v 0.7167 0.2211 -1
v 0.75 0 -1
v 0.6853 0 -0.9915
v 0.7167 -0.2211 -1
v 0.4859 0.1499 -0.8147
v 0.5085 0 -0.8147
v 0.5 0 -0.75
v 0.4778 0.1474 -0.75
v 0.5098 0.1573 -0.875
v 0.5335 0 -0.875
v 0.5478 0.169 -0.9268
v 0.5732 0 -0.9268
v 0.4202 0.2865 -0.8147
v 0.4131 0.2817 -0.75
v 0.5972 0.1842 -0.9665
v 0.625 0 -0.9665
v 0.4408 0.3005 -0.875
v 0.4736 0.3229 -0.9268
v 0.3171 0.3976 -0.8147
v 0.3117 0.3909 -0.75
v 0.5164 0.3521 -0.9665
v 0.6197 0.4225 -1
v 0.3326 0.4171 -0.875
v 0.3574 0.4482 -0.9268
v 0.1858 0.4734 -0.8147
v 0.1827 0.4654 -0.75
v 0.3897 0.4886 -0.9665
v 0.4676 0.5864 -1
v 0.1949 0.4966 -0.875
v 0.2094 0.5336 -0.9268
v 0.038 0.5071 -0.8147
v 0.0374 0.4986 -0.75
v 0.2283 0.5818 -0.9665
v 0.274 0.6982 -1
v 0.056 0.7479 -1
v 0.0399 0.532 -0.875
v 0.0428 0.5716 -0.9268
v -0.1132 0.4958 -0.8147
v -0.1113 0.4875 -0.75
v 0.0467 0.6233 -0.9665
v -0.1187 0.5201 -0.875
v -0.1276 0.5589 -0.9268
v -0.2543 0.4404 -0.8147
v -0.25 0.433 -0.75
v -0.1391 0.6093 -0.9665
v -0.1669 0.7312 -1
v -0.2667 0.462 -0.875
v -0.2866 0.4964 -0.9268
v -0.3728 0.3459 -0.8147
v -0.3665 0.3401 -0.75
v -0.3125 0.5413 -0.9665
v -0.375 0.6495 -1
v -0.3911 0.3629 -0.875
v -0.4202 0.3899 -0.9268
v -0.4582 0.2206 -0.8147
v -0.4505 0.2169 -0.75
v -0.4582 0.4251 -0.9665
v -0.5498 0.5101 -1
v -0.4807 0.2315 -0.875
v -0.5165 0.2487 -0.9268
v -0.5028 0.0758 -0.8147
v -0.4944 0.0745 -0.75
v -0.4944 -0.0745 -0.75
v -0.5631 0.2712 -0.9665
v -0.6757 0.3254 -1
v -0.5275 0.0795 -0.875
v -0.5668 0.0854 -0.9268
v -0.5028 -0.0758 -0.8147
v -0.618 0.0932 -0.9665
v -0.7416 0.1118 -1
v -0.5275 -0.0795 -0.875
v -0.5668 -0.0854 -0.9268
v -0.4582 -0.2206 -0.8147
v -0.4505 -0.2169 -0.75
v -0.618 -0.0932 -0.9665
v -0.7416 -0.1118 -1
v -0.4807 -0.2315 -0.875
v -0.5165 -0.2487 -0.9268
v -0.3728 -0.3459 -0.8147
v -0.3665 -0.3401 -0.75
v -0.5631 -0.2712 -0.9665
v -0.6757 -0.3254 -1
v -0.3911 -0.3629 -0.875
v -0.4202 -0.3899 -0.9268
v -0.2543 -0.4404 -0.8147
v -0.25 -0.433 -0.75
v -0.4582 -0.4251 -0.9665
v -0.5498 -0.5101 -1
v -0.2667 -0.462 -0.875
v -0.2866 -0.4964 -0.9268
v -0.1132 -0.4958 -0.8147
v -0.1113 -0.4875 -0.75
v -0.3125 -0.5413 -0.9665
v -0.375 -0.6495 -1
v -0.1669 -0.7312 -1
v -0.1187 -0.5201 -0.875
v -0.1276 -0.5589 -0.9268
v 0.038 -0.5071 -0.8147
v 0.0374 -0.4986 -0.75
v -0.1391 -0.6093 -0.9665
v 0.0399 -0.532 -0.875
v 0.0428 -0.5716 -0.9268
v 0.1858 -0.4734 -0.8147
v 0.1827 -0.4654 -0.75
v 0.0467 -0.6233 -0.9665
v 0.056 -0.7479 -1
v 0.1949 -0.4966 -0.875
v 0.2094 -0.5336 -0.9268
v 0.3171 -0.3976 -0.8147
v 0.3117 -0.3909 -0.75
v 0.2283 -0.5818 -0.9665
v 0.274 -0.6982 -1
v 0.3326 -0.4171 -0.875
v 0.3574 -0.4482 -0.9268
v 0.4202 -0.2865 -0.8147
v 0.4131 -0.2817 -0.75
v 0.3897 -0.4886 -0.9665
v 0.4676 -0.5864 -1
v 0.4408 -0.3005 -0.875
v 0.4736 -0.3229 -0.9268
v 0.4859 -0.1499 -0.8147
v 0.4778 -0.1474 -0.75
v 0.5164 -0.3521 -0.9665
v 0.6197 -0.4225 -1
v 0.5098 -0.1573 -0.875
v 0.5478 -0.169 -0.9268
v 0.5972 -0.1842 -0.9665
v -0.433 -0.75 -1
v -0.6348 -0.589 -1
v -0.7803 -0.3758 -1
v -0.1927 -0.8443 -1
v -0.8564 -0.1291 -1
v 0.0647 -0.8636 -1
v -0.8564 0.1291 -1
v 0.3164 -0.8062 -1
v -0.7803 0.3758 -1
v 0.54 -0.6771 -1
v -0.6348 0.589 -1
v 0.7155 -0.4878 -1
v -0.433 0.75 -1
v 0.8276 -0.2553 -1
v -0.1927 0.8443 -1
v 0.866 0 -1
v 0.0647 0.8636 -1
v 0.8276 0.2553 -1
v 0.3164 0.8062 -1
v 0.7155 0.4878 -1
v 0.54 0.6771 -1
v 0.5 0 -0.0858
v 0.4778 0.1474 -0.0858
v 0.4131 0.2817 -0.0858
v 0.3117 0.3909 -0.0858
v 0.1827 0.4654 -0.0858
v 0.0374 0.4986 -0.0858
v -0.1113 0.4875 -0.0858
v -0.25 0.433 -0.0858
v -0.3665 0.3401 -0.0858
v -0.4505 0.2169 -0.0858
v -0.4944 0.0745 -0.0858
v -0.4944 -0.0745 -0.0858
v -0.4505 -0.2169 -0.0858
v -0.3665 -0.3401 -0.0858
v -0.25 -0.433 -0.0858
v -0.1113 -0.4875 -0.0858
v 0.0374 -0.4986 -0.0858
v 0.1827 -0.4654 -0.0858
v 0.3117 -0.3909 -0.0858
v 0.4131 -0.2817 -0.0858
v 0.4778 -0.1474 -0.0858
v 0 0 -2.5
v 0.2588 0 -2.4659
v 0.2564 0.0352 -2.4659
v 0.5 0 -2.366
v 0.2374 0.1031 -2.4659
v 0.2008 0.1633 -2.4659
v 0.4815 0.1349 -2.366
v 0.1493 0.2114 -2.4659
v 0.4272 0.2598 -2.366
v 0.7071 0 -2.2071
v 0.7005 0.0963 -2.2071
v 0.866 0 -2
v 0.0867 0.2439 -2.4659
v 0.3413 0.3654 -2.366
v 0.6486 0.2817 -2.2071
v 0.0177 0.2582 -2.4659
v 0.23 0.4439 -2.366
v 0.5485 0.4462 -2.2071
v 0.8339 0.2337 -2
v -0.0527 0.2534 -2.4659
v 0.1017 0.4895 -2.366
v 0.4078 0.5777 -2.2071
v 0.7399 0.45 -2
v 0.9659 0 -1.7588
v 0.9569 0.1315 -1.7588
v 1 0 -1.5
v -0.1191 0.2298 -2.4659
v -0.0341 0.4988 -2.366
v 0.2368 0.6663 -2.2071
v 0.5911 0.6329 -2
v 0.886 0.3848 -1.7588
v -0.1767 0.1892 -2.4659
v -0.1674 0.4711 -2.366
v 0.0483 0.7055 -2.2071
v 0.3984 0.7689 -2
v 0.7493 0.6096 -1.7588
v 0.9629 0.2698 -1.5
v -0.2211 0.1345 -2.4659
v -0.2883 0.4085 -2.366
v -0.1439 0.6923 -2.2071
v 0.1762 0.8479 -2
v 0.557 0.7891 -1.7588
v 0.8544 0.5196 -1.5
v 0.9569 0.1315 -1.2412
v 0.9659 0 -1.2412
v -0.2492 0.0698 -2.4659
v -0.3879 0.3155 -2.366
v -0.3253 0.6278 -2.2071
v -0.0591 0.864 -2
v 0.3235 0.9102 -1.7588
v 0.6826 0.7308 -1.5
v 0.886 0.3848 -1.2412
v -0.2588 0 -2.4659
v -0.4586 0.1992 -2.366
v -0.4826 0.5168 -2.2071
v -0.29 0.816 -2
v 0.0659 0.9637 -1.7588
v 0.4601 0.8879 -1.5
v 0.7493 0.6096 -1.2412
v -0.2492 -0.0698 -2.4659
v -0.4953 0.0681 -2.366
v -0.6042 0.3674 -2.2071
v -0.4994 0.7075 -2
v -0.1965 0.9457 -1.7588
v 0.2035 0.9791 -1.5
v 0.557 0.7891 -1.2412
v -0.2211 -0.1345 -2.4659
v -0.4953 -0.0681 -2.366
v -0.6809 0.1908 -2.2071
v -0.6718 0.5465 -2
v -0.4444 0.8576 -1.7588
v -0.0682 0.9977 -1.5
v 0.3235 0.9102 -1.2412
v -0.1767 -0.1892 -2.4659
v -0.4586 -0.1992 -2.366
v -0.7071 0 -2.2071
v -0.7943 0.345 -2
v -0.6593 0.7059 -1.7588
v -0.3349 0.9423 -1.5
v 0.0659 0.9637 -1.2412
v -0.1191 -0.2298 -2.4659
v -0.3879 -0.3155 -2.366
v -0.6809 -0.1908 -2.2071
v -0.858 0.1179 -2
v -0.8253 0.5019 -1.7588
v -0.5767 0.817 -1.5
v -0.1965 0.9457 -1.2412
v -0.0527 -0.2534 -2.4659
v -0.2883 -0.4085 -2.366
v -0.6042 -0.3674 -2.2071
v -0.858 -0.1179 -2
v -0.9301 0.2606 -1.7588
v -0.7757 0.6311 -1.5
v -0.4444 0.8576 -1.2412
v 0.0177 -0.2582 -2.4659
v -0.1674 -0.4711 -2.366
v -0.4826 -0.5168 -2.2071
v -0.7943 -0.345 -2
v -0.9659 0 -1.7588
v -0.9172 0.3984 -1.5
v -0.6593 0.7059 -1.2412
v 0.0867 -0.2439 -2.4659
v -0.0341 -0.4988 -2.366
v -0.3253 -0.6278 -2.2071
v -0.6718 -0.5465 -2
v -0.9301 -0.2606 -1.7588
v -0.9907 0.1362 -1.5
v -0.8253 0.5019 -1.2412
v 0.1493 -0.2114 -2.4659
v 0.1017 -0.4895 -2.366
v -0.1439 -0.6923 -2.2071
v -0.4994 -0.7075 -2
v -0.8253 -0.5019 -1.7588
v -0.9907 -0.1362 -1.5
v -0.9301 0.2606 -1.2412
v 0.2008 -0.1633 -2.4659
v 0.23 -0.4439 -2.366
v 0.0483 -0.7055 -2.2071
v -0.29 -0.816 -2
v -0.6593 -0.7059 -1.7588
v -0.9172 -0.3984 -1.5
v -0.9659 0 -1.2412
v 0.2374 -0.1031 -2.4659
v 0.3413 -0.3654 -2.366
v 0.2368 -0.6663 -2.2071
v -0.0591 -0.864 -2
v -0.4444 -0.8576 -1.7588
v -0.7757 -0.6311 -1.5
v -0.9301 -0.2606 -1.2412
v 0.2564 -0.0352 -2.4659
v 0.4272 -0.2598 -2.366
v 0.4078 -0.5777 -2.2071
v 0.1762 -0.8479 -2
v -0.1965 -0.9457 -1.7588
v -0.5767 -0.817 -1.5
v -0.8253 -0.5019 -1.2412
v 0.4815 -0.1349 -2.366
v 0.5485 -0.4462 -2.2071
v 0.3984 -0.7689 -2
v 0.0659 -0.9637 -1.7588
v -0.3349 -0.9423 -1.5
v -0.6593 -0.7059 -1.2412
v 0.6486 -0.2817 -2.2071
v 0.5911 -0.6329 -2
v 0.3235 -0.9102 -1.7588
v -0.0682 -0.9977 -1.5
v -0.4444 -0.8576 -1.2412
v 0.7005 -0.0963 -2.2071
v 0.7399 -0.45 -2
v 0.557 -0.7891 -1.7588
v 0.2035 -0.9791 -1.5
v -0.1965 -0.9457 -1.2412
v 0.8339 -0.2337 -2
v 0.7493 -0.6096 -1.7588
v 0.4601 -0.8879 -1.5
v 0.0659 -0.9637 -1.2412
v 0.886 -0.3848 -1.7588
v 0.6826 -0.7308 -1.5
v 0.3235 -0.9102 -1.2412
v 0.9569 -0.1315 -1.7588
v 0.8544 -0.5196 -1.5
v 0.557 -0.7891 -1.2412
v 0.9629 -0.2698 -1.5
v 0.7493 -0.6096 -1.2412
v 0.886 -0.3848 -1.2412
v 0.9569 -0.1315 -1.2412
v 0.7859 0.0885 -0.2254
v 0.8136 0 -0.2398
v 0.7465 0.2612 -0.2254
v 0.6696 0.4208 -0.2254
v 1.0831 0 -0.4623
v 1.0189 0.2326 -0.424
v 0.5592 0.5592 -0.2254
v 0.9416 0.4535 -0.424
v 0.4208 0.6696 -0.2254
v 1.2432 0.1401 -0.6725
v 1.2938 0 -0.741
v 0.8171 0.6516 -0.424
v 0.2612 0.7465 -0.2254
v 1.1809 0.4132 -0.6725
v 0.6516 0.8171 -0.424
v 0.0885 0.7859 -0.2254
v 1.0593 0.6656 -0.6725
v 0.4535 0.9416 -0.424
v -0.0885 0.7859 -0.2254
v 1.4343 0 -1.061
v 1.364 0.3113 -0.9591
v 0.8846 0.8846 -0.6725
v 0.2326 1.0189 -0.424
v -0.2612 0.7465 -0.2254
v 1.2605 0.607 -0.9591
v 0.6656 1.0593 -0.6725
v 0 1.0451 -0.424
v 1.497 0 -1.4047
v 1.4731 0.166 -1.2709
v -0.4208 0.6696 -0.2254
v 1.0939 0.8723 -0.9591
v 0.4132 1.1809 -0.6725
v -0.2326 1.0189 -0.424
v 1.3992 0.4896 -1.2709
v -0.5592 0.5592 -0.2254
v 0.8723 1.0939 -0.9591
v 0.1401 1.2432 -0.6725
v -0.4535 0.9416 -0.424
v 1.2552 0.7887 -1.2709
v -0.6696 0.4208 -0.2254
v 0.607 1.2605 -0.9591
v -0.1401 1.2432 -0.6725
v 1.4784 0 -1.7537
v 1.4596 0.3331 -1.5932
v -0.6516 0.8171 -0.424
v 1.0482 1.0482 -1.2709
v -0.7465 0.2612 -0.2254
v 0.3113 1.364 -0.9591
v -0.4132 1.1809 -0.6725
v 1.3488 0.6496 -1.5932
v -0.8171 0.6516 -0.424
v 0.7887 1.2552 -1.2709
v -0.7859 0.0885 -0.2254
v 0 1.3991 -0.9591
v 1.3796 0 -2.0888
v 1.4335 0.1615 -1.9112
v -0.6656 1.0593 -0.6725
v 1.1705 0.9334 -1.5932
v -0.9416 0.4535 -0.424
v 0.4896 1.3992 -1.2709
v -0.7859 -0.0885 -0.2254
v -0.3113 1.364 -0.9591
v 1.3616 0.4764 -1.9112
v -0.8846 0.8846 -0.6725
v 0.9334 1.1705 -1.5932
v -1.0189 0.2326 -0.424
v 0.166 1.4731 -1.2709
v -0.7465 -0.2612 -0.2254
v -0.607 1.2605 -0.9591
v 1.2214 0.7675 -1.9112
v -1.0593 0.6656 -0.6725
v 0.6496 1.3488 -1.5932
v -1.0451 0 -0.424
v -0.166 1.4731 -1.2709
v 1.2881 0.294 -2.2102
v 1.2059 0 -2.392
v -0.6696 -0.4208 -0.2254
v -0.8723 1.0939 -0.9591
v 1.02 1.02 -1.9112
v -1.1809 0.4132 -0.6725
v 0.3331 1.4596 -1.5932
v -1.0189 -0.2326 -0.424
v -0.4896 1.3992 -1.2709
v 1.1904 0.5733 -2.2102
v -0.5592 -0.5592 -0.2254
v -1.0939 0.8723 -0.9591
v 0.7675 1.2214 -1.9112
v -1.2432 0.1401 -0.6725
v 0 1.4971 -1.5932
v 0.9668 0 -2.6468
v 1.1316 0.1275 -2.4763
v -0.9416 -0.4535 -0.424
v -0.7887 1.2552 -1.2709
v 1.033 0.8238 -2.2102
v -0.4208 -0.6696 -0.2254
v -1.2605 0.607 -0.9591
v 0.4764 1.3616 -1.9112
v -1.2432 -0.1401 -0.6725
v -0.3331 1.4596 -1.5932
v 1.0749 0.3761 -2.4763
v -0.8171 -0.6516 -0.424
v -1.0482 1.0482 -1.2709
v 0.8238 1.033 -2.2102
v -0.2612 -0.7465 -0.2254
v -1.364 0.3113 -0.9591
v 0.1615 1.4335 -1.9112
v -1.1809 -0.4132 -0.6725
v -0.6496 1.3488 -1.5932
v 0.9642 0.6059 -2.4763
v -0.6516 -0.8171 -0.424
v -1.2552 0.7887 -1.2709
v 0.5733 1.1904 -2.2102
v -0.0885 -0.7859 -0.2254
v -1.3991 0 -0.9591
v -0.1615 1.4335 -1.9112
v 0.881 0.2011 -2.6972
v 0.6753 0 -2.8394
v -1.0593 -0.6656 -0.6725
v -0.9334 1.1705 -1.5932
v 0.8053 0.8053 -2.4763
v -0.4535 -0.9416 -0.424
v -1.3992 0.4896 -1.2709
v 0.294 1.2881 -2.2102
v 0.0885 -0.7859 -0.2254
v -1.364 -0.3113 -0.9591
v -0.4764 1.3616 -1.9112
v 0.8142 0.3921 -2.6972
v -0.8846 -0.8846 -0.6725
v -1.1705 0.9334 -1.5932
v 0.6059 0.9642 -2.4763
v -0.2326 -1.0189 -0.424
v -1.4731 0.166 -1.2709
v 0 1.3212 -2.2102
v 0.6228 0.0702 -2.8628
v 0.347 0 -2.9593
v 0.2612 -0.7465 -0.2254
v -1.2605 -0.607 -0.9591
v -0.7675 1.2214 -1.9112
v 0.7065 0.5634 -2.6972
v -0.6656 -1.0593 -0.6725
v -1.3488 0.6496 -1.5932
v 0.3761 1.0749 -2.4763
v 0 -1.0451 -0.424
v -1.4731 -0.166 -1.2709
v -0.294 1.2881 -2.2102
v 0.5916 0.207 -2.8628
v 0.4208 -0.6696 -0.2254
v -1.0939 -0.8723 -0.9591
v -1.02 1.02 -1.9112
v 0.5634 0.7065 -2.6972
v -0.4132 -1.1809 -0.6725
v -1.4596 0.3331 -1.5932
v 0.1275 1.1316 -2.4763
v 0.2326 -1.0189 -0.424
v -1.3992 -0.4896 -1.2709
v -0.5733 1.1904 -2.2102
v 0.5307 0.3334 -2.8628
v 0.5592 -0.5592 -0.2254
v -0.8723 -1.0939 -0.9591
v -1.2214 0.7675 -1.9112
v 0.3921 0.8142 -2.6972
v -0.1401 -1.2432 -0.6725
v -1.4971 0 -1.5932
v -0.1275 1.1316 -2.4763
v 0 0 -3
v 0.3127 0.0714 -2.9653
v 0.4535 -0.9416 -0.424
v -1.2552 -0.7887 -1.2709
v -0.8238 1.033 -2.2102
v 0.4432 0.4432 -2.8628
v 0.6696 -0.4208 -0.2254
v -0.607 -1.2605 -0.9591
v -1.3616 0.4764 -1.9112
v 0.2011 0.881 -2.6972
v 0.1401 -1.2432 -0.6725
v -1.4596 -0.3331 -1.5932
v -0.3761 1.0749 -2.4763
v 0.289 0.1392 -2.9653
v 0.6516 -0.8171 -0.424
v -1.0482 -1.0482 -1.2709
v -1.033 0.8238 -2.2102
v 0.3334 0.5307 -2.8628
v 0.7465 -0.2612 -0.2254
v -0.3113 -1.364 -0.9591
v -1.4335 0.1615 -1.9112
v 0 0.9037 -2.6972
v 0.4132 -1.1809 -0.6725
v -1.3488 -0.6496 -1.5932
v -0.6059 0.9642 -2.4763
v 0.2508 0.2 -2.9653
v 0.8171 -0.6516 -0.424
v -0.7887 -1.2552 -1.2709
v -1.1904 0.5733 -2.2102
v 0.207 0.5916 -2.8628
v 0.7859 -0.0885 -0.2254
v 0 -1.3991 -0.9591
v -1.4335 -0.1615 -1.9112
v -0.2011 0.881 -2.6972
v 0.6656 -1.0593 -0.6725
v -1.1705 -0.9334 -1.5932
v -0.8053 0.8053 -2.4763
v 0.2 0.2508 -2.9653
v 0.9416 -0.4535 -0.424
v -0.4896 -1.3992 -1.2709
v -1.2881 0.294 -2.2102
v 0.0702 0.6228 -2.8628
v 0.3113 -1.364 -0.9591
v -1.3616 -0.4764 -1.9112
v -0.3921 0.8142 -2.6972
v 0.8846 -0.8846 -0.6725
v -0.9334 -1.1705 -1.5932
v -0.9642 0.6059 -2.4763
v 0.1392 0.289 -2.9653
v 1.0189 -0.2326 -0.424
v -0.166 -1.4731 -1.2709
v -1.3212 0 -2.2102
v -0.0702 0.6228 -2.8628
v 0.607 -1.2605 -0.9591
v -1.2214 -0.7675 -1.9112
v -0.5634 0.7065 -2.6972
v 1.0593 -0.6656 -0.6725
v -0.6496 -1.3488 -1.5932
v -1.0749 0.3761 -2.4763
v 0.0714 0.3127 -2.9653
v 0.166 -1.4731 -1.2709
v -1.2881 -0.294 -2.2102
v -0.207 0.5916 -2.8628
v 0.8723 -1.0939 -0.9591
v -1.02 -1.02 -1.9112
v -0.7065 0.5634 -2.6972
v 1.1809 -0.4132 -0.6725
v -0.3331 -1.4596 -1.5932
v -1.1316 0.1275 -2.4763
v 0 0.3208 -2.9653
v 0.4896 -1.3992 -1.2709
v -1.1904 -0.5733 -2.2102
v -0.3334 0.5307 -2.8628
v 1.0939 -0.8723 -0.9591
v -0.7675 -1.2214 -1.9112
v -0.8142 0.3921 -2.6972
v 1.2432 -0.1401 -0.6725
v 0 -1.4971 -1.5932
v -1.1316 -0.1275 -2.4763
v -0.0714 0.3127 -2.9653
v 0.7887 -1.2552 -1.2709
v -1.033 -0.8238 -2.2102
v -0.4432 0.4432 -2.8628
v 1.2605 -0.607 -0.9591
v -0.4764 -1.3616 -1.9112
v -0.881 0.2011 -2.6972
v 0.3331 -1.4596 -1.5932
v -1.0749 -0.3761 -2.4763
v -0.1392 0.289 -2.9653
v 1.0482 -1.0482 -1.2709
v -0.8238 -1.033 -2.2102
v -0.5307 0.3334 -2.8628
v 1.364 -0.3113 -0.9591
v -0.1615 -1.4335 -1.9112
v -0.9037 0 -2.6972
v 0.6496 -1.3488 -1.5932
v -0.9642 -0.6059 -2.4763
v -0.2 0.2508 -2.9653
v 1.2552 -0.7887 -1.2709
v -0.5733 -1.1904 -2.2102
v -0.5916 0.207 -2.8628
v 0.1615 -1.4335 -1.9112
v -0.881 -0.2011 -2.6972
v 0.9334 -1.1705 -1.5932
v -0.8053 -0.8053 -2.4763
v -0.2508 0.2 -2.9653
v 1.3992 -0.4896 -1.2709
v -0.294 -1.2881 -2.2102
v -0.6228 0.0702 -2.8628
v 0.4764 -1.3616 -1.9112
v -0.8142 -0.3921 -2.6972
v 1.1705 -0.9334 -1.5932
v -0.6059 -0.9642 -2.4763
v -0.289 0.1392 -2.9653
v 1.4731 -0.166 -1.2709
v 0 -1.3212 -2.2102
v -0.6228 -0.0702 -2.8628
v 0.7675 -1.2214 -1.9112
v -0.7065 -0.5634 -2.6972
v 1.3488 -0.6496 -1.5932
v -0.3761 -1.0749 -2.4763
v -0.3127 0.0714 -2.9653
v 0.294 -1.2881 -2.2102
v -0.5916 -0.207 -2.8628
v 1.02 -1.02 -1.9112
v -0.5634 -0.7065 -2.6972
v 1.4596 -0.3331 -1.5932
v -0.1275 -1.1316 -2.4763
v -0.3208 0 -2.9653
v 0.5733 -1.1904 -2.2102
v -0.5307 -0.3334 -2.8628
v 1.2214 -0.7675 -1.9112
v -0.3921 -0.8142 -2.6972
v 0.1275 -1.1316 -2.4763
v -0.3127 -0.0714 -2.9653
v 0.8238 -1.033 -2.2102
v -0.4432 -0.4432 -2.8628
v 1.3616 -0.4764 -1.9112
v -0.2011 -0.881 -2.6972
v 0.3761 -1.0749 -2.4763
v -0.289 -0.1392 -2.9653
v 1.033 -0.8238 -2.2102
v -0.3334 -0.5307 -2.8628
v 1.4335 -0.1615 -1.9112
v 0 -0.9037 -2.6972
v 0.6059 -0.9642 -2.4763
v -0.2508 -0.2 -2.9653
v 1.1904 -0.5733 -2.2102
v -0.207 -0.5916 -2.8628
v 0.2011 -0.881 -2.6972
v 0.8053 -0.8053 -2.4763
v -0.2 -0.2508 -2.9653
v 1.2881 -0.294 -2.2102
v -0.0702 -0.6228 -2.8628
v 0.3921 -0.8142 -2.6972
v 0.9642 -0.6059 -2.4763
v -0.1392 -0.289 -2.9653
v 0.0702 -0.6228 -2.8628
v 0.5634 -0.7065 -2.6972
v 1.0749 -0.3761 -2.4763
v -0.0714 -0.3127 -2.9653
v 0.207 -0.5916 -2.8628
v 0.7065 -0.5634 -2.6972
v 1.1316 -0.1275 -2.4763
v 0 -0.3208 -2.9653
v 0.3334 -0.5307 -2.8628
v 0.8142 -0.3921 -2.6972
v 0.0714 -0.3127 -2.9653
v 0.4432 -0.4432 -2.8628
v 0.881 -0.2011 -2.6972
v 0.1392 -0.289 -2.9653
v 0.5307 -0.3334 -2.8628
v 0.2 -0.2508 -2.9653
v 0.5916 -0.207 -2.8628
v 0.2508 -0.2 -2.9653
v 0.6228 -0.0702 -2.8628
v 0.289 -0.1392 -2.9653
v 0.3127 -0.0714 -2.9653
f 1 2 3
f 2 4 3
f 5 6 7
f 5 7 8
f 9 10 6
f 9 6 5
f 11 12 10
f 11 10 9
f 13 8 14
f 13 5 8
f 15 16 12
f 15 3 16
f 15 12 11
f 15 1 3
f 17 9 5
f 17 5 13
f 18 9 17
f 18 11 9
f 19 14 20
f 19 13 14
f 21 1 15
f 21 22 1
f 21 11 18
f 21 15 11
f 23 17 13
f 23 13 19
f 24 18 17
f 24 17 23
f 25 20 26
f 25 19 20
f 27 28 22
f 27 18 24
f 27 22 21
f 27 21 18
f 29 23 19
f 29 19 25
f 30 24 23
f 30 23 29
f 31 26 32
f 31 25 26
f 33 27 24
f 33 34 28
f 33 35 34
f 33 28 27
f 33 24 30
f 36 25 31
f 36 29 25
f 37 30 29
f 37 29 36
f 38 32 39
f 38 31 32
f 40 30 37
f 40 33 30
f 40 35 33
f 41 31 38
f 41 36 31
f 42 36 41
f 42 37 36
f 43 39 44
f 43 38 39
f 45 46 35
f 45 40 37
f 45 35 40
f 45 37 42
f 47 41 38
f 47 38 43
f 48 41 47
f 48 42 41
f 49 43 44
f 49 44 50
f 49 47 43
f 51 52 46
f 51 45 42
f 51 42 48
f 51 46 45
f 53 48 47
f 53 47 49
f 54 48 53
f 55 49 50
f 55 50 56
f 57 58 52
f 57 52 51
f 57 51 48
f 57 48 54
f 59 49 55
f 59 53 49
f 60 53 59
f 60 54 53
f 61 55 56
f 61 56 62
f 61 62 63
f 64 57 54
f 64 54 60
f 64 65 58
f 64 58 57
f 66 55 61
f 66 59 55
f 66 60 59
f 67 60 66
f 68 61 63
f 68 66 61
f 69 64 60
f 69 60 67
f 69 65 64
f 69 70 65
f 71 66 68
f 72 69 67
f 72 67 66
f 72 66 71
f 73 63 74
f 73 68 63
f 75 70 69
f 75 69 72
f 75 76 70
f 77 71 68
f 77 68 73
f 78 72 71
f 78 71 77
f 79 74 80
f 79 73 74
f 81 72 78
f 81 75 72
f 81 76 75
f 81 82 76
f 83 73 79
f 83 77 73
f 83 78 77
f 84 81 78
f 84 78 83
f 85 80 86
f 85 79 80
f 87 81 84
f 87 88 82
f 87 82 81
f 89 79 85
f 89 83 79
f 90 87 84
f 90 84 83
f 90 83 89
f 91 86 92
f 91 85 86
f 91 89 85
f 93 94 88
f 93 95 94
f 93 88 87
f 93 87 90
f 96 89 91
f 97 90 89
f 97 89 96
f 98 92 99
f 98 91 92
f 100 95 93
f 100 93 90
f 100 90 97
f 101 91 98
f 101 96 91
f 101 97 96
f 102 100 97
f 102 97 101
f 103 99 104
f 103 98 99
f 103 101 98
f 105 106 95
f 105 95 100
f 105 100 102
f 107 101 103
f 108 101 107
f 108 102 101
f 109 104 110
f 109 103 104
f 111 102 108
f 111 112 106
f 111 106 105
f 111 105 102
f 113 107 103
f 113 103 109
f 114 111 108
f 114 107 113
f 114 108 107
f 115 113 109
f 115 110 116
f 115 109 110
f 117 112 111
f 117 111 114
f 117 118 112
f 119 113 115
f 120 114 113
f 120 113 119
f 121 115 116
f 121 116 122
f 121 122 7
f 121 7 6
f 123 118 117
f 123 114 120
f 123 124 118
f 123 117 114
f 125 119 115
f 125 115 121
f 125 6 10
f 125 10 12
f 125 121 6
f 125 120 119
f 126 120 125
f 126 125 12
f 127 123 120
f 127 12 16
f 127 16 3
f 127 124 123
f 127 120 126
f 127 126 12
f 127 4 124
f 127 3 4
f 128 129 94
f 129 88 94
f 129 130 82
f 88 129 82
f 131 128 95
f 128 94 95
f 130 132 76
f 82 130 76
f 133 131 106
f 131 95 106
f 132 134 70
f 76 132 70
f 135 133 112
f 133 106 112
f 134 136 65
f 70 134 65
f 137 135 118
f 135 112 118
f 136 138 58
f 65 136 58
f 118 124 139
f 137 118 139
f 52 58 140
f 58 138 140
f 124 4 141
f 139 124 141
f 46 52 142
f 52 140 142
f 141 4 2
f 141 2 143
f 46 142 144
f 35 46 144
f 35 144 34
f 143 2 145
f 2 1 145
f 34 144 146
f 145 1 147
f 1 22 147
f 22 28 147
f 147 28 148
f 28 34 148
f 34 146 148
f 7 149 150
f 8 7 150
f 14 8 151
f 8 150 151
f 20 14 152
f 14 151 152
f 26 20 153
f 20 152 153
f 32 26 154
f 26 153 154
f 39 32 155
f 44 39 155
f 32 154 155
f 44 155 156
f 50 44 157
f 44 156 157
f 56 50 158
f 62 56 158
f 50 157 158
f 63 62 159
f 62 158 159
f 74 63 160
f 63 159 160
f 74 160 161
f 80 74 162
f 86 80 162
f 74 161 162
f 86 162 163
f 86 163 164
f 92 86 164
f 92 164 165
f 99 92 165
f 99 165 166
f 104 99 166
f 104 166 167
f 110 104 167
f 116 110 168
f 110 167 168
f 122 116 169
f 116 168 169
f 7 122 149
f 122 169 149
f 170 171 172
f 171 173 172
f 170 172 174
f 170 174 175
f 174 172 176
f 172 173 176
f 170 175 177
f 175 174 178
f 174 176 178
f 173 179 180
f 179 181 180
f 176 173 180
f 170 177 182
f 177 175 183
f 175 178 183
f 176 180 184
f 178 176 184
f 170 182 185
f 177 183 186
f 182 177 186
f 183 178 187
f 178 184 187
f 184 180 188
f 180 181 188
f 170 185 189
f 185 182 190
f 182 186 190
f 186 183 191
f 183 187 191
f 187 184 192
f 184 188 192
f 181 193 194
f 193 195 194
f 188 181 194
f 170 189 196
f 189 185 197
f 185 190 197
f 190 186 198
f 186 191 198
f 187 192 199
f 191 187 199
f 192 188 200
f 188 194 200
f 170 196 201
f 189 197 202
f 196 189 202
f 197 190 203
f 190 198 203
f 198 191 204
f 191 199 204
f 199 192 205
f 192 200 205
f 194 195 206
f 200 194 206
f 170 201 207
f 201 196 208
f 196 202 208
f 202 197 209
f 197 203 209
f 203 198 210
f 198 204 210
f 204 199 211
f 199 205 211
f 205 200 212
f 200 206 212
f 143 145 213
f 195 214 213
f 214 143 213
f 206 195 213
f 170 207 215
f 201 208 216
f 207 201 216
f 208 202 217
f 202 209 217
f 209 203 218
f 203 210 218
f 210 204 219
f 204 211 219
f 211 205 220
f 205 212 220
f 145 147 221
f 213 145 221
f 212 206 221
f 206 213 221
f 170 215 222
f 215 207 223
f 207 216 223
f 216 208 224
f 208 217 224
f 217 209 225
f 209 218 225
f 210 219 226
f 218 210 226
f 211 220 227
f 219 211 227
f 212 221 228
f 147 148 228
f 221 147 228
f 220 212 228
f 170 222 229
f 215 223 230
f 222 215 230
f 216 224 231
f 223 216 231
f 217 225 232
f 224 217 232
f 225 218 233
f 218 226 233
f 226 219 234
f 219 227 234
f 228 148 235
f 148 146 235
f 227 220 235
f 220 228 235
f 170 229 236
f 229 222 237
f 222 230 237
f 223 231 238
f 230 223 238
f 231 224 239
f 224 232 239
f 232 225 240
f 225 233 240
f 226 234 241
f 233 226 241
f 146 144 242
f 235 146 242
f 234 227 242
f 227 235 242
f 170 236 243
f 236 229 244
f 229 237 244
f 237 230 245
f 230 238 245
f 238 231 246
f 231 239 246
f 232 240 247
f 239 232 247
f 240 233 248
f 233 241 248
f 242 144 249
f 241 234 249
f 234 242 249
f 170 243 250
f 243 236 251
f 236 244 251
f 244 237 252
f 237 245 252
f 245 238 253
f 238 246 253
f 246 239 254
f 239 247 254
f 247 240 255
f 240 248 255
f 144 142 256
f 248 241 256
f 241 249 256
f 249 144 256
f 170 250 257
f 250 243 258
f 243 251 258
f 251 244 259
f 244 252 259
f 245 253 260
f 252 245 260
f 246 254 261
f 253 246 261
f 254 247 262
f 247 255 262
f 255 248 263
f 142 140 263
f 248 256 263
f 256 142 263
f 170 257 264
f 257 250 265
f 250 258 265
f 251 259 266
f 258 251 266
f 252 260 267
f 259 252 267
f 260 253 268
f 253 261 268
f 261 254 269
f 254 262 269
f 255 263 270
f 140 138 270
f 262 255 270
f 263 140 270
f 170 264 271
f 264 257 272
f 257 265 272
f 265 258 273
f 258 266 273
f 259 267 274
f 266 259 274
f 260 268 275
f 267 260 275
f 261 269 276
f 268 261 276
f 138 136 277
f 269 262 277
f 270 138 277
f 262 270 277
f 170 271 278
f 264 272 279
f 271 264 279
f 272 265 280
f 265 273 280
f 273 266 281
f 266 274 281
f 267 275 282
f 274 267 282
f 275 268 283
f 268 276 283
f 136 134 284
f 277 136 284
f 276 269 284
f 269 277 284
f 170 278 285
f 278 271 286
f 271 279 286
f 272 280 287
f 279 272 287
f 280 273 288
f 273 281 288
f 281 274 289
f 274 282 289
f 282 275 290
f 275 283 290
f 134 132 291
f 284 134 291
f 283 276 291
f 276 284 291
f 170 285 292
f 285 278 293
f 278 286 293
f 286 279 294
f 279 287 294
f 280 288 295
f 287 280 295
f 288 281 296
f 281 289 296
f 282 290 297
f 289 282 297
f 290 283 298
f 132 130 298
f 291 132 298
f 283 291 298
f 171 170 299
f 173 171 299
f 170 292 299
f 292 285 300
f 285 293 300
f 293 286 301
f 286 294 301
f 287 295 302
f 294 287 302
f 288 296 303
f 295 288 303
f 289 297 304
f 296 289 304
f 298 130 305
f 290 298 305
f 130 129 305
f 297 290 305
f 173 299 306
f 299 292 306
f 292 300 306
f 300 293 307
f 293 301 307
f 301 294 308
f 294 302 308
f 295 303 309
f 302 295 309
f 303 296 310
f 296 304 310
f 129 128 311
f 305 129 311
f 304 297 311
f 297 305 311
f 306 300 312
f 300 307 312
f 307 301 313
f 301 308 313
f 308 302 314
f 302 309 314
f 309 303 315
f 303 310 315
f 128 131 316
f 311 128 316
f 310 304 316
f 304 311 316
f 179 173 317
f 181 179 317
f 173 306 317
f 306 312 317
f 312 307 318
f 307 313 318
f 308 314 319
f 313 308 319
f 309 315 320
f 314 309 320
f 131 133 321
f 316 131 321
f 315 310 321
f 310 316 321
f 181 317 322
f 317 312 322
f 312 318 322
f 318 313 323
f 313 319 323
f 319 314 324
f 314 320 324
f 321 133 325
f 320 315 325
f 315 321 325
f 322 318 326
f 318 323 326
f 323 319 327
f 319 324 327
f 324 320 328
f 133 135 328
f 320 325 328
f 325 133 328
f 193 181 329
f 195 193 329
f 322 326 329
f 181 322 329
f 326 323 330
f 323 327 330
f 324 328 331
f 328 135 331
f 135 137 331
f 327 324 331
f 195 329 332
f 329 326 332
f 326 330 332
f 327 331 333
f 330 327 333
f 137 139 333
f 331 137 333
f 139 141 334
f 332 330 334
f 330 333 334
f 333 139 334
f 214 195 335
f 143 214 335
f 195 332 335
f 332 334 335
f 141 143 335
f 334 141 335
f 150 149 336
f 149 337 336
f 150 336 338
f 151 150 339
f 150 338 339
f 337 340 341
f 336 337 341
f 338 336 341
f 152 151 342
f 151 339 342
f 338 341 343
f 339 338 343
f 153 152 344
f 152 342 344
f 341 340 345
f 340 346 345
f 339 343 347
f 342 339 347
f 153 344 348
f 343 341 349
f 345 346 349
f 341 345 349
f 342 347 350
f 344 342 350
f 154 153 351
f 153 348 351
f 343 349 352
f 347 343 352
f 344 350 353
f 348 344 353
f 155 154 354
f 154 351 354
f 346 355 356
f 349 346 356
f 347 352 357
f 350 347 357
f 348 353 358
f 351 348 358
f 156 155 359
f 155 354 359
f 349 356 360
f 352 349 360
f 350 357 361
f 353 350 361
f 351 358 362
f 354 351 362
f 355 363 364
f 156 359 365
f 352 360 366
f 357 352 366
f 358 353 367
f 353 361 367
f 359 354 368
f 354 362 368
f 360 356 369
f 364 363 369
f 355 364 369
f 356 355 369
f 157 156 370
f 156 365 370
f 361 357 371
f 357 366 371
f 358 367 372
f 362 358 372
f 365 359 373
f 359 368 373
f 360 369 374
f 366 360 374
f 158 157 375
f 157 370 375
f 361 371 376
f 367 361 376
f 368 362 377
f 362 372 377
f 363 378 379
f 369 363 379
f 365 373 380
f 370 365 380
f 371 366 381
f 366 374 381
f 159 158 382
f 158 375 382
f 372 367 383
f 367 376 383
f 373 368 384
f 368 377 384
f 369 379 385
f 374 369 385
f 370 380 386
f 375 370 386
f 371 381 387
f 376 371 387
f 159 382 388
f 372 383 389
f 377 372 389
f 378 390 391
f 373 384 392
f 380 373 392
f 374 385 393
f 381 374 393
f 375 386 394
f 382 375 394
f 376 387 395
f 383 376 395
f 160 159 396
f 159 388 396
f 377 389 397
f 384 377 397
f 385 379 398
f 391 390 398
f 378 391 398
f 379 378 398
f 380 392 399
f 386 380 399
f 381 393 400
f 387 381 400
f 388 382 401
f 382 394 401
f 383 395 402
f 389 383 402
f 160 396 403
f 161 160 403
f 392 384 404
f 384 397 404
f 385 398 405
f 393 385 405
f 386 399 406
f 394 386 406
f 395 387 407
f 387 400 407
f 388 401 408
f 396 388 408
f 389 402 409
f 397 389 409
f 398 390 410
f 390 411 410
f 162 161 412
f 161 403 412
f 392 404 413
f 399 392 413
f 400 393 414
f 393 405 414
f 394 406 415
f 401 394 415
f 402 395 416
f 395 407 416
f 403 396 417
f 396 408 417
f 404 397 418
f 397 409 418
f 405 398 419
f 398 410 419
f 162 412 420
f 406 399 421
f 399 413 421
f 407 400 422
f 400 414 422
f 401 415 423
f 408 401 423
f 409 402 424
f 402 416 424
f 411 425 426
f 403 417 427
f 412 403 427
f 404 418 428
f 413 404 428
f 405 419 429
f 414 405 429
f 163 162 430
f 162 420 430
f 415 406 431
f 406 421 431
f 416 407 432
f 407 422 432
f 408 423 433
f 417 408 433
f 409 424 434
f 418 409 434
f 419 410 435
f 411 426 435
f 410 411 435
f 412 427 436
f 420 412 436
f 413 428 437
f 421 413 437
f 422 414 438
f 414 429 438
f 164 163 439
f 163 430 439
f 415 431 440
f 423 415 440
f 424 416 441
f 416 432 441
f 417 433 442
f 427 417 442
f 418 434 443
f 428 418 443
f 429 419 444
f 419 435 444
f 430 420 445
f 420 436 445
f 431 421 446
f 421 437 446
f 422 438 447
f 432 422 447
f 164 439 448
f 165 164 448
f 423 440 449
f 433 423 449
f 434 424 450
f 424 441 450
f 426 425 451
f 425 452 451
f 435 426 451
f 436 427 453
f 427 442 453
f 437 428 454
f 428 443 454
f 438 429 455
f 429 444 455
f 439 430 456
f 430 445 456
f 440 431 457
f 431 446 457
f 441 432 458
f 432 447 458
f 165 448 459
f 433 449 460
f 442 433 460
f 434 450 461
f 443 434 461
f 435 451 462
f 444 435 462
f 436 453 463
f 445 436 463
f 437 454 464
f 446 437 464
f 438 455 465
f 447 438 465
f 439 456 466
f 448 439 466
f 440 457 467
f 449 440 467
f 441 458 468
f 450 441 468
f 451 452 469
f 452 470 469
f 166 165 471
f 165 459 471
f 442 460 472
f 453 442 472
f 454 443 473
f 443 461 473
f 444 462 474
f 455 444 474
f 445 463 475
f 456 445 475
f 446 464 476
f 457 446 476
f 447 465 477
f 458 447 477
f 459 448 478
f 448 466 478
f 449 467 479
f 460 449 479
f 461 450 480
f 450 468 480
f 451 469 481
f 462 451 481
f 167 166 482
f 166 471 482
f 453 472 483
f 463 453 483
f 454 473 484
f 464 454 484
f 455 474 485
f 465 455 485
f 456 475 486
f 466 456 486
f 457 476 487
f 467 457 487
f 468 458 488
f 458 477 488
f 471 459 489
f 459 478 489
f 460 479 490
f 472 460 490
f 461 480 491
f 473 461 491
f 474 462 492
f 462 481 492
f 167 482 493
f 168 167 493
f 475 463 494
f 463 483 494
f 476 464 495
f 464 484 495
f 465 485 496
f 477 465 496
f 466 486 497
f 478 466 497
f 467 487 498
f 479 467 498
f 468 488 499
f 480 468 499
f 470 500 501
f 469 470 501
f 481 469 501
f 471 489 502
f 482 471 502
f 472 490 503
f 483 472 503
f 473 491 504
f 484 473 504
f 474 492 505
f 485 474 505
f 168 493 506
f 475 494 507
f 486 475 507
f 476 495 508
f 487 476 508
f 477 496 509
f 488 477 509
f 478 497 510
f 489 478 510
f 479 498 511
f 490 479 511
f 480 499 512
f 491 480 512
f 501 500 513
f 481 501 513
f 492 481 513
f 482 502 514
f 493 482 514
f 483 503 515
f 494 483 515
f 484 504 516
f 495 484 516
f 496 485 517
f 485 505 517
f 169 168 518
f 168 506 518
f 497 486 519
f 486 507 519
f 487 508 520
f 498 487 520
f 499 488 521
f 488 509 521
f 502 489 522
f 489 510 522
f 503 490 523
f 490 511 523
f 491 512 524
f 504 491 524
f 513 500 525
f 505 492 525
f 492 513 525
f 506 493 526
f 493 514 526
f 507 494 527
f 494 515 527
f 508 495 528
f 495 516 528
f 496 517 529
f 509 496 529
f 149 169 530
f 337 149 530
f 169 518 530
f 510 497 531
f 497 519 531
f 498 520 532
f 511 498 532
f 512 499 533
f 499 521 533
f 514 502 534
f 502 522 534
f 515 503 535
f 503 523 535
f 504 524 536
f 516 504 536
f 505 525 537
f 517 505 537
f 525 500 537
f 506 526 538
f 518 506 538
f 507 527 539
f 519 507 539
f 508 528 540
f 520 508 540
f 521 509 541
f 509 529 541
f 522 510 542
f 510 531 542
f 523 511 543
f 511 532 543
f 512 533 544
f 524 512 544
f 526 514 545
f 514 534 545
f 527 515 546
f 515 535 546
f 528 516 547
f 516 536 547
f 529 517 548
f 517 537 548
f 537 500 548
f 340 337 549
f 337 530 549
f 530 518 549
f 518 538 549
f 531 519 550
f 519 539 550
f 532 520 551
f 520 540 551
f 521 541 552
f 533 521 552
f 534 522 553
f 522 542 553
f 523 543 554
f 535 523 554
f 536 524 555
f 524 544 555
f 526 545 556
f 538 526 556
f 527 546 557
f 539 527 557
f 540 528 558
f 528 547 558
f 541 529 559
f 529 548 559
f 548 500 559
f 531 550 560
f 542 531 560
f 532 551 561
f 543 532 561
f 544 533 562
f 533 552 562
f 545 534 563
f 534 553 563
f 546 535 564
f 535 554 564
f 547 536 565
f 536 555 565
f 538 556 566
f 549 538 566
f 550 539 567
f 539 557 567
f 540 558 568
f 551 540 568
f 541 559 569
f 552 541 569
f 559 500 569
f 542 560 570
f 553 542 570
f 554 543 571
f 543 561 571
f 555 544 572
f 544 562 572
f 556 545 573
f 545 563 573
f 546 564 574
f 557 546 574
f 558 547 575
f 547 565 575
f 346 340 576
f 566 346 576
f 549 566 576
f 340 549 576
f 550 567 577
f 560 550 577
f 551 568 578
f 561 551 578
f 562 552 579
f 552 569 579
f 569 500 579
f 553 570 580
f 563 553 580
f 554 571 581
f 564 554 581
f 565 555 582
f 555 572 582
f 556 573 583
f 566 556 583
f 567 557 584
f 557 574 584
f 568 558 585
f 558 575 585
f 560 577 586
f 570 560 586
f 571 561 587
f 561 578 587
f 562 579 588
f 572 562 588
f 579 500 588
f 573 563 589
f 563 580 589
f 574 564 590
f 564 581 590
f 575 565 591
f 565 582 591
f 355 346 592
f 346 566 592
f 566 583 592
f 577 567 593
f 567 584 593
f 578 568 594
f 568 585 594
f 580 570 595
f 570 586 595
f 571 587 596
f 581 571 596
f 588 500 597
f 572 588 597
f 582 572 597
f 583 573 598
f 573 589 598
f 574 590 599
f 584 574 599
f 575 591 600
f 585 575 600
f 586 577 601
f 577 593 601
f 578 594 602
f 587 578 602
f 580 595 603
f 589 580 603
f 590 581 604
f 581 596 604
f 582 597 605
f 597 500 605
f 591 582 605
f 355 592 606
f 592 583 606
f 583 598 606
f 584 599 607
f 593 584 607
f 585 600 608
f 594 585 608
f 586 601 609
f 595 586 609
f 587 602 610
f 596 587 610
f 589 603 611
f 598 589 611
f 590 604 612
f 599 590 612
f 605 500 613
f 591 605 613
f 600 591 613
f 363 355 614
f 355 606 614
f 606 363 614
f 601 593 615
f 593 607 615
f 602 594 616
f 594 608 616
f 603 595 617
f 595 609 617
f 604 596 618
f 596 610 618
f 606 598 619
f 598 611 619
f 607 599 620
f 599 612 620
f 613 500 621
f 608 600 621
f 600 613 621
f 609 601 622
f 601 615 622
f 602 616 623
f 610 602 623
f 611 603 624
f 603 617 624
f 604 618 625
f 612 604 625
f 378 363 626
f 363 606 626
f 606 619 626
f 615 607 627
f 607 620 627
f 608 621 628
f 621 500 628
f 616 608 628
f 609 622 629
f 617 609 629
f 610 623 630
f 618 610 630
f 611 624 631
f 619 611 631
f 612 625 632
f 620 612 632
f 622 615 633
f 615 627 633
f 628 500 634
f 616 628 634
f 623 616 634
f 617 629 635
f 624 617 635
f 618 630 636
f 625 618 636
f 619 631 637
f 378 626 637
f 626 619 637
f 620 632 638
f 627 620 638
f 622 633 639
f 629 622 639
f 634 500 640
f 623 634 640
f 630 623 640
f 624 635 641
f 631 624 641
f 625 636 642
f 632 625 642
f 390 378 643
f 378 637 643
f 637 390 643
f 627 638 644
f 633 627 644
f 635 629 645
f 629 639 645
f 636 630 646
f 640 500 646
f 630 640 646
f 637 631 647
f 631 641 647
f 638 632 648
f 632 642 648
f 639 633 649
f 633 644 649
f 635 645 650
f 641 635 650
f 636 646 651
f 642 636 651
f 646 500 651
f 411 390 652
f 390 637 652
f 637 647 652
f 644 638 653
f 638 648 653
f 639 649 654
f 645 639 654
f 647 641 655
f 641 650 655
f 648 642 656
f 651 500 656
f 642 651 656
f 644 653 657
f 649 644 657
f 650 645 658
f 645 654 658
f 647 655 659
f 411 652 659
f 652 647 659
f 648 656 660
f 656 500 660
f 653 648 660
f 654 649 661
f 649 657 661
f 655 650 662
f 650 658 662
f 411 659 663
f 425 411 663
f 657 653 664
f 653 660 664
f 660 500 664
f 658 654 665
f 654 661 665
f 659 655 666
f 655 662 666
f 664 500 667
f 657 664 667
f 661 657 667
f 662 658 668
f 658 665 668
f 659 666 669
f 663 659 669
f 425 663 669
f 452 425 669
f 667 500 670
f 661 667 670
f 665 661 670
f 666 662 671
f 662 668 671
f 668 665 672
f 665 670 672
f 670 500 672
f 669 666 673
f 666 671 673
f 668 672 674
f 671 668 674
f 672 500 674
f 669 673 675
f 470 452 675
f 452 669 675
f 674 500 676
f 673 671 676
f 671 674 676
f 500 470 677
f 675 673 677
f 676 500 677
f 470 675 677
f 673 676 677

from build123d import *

# Parameters (mm, degrees)
FILLET1_R = 0.25


# Read off the part's stored shape, not the designer's step: Shell1
with BuildPart() as part:
    # Sketch1 → Revolve1 (revolve)
    with BuildSketch(Plane(origin=(0, 0, 0), x_dir=(1, 0, 0), z_dir=(0, 1, 0)), mode=Mode.PRIVATE) as revolve1_sk:
        with BuildLine():
            Line((0, 1), (-0.5, 1))
            Line((-0.5, 1), (-0.5, 0.085786438))
            ThreePointArc((-0.5, 0.085786438), (-1.478397839, 1.753652968), (0, 3))
            Line((0, 3), (0, 1))
        make_face()
    revolve(revolve1_sk.sketch.rotate(Axis((0, 0, -4.268887564), (0, 0, 1)), 180), axis=Axis((0, 0, -4.268887564), (0, 0, 1)))

    # Shell1 outline → Shell1 (revolve, cut)
    with BuildSketch(Plane.XZ):
        with BuildLine():
            Line((0.866025403, -1), (0, -0.999999999))
            Line((0, -0.999999999), (0, -2.5))
            ThreePointArc((0, -2.5), (0.866025404, -2), (0.866025403, -1))
        make_face()
    revolve(axis=Axis((0, 0, 0), (0, 0, 1)), mode=Mode.SUBTRACT)

    # Fillet1
    fillet1_edges = [part.edges().sort_by_distance(p)[0] for p in [
        (-0.5, 0, -1),
    ]]
    fillet(fillet1_edges, radius=FILLET1_R)


solid = part.part
